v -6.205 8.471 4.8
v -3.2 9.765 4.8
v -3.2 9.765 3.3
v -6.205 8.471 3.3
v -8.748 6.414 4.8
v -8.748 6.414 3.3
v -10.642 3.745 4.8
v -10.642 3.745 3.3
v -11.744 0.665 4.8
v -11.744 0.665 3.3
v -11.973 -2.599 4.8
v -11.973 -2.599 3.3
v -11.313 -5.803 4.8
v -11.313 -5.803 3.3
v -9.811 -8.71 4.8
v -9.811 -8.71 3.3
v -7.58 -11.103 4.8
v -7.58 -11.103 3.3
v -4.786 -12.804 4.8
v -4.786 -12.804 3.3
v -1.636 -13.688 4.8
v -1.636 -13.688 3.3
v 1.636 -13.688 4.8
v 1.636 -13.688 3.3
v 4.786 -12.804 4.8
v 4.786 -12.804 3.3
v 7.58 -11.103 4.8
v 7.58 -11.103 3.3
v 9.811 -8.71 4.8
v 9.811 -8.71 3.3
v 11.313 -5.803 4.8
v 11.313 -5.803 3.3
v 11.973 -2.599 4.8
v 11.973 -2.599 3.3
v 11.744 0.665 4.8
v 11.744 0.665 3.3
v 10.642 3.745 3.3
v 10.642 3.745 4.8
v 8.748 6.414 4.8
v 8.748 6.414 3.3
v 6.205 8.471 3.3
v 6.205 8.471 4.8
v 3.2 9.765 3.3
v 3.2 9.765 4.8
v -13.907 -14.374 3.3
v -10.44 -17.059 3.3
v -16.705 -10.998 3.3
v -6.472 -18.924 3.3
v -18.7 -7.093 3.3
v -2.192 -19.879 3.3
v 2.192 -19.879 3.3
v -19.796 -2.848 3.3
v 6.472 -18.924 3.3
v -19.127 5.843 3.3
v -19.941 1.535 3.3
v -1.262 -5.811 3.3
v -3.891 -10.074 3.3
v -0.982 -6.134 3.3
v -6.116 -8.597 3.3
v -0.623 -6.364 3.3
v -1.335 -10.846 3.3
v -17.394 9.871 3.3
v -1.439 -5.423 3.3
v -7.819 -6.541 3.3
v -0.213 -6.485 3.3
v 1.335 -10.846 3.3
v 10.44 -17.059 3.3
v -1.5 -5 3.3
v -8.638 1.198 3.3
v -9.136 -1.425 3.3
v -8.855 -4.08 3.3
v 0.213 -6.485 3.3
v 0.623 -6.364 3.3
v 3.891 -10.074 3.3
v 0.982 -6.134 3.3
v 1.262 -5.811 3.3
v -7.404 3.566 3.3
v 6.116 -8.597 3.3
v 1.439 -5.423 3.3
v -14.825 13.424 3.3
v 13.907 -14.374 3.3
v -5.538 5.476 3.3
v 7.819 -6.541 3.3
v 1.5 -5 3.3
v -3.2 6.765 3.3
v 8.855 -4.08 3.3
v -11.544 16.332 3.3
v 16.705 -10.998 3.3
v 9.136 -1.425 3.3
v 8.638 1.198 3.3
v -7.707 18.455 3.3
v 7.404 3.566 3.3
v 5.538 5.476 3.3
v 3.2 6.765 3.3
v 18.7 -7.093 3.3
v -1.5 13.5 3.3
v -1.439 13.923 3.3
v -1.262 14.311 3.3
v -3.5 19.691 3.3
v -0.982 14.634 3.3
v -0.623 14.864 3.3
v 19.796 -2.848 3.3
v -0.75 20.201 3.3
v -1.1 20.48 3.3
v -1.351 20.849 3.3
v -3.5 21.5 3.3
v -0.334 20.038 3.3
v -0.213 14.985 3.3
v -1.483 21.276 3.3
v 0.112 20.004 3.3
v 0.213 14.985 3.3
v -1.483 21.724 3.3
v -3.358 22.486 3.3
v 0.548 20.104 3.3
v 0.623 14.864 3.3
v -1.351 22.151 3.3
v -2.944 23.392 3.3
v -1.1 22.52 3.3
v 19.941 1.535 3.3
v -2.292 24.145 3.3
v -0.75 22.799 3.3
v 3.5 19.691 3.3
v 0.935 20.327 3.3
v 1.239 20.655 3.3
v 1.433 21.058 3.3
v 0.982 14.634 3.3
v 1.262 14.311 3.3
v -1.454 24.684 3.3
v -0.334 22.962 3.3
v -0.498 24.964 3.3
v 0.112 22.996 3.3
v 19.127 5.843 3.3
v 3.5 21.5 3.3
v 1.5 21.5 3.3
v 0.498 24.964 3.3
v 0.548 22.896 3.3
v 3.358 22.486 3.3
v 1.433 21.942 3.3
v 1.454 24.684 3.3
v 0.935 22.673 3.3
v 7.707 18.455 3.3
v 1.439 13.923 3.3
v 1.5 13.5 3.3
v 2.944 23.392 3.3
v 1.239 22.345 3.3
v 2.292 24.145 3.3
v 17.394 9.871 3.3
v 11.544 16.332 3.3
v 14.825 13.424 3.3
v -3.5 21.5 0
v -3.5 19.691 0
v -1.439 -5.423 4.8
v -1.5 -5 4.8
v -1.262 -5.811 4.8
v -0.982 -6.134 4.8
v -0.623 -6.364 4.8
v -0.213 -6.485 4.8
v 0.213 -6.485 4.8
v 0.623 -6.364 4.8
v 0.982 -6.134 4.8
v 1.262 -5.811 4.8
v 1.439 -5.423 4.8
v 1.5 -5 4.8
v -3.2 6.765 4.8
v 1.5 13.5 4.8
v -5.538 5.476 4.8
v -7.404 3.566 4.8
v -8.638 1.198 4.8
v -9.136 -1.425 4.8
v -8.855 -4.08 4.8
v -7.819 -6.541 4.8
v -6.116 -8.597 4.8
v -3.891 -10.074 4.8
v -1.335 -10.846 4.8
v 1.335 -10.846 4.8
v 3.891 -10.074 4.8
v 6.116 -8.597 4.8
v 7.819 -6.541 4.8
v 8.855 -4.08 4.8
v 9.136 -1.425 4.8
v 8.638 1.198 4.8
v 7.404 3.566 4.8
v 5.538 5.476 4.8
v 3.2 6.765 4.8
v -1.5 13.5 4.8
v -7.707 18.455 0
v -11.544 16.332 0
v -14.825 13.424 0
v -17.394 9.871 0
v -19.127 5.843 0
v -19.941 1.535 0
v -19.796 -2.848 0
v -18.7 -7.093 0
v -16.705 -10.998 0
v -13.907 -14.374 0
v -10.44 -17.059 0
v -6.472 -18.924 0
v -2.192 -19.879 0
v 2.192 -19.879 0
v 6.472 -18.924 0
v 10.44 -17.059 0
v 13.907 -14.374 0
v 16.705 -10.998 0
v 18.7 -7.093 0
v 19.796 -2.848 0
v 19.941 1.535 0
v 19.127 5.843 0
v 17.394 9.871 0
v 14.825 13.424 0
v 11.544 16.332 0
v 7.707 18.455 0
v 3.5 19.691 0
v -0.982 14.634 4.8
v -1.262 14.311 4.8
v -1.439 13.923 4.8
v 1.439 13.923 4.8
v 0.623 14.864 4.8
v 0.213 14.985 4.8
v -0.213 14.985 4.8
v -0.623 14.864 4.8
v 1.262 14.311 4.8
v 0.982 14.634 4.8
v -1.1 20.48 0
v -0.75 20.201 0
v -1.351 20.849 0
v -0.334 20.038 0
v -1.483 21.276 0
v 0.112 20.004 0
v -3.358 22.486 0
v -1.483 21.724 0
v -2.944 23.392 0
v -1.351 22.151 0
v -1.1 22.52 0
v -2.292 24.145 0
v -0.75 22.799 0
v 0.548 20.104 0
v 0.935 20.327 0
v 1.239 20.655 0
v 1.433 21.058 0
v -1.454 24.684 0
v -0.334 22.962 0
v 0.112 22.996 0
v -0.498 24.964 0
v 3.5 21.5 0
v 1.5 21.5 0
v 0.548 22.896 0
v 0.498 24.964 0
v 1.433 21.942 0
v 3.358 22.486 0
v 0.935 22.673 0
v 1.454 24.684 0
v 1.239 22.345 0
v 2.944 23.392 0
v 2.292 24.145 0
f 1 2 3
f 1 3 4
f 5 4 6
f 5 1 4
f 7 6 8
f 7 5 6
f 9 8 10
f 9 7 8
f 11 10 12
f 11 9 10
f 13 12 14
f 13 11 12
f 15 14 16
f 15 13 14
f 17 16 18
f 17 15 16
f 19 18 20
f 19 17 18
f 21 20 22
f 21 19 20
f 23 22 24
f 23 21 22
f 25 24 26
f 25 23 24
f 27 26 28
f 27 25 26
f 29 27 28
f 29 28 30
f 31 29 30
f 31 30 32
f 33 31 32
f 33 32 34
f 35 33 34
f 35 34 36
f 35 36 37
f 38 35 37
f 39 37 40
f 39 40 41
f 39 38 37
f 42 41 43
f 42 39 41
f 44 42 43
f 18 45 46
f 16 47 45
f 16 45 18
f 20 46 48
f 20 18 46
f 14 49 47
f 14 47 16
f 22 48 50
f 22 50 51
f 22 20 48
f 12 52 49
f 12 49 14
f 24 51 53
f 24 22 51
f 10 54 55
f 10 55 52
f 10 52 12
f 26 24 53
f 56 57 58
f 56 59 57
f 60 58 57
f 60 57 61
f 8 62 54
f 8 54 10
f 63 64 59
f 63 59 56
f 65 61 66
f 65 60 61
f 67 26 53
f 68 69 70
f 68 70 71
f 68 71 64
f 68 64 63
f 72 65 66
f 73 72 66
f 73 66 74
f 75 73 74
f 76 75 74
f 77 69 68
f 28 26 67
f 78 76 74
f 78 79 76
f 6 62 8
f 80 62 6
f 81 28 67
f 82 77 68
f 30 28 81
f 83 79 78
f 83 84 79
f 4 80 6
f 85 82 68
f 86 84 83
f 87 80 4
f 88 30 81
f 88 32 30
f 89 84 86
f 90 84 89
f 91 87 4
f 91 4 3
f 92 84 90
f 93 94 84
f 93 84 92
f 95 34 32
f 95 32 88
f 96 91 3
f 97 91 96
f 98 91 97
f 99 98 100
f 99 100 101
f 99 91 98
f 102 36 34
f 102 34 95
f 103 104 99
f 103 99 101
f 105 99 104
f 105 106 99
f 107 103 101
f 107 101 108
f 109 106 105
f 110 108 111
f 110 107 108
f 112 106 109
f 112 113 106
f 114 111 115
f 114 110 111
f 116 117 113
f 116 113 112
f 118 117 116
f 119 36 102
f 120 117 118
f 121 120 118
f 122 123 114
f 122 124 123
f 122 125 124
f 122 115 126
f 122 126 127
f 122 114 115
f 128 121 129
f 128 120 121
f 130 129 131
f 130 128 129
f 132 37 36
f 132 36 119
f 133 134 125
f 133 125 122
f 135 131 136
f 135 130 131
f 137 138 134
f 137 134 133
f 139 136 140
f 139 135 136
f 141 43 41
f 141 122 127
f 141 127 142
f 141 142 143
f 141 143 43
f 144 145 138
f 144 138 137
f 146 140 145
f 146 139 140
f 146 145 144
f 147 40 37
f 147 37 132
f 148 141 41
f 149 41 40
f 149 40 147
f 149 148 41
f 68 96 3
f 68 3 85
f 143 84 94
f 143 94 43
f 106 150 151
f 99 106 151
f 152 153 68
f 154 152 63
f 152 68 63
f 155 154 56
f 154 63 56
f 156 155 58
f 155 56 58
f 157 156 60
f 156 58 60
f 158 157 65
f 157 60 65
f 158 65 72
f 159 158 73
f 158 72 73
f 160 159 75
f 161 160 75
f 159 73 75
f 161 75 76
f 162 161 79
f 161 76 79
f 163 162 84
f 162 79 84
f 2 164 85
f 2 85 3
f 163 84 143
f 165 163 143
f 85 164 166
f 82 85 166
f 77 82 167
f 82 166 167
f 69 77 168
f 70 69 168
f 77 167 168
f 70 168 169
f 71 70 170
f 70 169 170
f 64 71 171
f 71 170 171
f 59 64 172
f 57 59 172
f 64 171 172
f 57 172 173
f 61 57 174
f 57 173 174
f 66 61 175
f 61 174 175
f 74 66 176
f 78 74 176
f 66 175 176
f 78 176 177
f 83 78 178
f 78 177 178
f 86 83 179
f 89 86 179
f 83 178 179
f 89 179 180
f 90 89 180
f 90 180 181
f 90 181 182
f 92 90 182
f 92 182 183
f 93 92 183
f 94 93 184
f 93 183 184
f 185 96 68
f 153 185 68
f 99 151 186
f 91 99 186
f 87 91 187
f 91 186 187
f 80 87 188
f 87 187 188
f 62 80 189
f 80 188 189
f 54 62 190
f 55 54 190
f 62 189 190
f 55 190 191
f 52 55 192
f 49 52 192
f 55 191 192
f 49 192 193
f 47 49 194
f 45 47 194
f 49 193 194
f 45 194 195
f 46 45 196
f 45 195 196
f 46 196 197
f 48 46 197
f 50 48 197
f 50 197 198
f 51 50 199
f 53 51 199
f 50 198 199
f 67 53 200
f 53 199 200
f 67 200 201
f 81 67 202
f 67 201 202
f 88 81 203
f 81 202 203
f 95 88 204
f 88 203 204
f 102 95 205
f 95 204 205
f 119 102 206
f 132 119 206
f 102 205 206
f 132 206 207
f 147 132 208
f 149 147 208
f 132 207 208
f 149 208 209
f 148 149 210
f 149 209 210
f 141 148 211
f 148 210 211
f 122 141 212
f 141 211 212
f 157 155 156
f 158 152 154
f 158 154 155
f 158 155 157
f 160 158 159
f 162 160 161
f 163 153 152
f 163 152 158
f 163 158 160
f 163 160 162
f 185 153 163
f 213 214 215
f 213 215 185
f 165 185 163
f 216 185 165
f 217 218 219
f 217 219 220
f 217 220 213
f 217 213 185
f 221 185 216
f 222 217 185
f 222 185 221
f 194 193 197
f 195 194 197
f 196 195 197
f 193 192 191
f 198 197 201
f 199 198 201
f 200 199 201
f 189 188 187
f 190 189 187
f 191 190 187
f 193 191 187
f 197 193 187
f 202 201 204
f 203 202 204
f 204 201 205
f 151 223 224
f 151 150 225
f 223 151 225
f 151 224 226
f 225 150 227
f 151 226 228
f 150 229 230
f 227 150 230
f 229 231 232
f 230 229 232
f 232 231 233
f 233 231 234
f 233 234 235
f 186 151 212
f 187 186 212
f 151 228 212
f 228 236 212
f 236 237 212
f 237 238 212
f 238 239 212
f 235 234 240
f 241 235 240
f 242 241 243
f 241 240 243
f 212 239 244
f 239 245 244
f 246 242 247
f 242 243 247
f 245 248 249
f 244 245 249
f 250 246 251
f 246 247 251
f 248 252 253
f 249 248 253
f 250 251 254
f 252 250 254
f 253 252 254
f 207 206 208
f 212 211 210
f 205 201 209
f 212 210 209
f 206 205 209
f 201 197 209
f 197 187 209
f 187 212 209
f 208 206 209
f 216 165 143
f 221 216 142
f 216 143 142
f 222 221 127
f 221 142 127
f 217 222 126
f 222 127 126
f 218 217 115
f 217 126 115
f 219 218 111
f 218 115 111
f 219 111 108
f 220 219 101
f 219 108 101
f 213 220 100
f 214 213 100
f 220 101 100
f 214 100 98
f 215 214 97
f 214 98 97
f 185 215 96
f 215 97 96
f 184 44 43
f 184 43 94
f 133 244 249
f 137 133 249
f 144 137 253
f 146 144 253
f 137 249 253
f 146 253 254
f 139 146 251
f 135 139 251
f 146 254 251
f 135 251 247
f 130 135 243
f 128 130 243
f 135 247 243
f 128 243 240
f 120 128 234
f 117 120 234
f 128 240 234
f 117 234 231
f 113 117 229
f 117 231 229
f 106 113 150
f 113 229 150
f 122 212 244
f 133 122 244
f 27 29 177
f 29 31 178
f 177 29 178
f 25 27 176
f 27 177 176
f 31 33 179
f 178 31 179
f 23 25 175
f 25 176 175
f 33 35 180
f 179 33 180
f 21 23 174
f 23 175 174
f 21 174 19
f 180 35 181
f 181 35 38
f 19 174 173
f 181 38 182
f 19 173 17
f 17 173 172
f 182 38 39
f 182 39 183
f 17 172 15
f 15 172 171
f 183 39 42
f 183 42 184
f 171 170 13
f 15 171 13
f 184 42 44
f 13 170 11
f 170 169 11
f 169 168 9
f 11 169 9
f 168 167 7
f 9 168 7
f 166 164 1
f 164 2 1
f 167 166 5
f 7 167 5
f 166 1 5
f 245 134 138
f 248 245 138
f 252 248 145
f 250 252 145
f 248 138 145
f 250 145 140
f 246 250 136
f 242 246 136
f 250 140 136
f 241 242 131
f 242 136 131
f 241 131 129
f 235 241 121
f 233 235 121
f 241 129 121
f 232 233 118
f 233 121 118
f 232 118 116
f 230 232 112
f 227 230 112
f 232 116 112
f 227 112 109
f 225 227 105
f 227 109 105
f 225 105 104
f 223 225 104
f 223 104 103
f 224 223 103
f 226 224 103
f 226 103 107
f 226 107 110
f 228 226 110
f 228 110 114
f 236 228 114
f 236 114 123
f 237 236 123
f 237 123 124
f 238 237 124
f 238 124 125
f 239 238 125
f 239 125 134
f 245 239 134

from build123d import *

# Parameters (mm, degrees)
EXTRUDE_DEPTH = 3.3
SKETCH001_R   = 1.5
POCKET_DEPTH  = 3.301
PAD_DEPTH     = 1.5


with BuildPart() as part:
    # Sketch → Extrude (new body)
    with BuildSketch(Plane.XY):
        with BuildLine():
            ThreePointArc((3.5, 21.5), (0, 25), (-3.5, 21.5))
            Line((-3.5, 21.5), (-3.5, 19.691369))
            ThreePointArc((-3.5, 19.691369), (0, -20), (3.5, 19.691369))
            Line((3.5, 19.691369), (3.5, 21.5))
        make_face()
    extrude(amount=EXTRUDE_DEPTH)

    # Sketch001 → Pocket (cut, through all)
    with BuildSketch(Plane.XY.offset(3.3)):
        with Locations((0, 21.5)):
            Circle(SKETCH001_R)
    extrude(amount=-POCKET_DEPTH, mode=Mode.SUBTRACT)

    # Sketch002 → Pad (new body, symmetric)
    with BuildSketch(Plane.XY.offset(3.3)):
        with BuildLine():
            Line((-1.5, 13.5), (-1.5, -5))
            ThreePointArc((-1.5, -5), (0, -6.5), (1.5, -5))
            Line((1.5, -5), (1.5, 13.5))
            ThreePointArc((1.5, 13.5), (0, 15), (-1.5, 13.5))
        make_face()
        with BuildLine():
            ThreePointArc((-3.2, 6.765466), (0, -10.943698), (3.2, 6.765466))
            Line((3.2, 9.765466), (3.2, 6.765466))
            ThreePointArc((-3.2, 9.765466), (0, -13.8), (3.2, 9.765466))
            Line((-3.2, 6.765466), (-3.2, 9.765466))
        make_face()
    extrude(amount=PAD_DEPTH, both=True)


solid = part.part
